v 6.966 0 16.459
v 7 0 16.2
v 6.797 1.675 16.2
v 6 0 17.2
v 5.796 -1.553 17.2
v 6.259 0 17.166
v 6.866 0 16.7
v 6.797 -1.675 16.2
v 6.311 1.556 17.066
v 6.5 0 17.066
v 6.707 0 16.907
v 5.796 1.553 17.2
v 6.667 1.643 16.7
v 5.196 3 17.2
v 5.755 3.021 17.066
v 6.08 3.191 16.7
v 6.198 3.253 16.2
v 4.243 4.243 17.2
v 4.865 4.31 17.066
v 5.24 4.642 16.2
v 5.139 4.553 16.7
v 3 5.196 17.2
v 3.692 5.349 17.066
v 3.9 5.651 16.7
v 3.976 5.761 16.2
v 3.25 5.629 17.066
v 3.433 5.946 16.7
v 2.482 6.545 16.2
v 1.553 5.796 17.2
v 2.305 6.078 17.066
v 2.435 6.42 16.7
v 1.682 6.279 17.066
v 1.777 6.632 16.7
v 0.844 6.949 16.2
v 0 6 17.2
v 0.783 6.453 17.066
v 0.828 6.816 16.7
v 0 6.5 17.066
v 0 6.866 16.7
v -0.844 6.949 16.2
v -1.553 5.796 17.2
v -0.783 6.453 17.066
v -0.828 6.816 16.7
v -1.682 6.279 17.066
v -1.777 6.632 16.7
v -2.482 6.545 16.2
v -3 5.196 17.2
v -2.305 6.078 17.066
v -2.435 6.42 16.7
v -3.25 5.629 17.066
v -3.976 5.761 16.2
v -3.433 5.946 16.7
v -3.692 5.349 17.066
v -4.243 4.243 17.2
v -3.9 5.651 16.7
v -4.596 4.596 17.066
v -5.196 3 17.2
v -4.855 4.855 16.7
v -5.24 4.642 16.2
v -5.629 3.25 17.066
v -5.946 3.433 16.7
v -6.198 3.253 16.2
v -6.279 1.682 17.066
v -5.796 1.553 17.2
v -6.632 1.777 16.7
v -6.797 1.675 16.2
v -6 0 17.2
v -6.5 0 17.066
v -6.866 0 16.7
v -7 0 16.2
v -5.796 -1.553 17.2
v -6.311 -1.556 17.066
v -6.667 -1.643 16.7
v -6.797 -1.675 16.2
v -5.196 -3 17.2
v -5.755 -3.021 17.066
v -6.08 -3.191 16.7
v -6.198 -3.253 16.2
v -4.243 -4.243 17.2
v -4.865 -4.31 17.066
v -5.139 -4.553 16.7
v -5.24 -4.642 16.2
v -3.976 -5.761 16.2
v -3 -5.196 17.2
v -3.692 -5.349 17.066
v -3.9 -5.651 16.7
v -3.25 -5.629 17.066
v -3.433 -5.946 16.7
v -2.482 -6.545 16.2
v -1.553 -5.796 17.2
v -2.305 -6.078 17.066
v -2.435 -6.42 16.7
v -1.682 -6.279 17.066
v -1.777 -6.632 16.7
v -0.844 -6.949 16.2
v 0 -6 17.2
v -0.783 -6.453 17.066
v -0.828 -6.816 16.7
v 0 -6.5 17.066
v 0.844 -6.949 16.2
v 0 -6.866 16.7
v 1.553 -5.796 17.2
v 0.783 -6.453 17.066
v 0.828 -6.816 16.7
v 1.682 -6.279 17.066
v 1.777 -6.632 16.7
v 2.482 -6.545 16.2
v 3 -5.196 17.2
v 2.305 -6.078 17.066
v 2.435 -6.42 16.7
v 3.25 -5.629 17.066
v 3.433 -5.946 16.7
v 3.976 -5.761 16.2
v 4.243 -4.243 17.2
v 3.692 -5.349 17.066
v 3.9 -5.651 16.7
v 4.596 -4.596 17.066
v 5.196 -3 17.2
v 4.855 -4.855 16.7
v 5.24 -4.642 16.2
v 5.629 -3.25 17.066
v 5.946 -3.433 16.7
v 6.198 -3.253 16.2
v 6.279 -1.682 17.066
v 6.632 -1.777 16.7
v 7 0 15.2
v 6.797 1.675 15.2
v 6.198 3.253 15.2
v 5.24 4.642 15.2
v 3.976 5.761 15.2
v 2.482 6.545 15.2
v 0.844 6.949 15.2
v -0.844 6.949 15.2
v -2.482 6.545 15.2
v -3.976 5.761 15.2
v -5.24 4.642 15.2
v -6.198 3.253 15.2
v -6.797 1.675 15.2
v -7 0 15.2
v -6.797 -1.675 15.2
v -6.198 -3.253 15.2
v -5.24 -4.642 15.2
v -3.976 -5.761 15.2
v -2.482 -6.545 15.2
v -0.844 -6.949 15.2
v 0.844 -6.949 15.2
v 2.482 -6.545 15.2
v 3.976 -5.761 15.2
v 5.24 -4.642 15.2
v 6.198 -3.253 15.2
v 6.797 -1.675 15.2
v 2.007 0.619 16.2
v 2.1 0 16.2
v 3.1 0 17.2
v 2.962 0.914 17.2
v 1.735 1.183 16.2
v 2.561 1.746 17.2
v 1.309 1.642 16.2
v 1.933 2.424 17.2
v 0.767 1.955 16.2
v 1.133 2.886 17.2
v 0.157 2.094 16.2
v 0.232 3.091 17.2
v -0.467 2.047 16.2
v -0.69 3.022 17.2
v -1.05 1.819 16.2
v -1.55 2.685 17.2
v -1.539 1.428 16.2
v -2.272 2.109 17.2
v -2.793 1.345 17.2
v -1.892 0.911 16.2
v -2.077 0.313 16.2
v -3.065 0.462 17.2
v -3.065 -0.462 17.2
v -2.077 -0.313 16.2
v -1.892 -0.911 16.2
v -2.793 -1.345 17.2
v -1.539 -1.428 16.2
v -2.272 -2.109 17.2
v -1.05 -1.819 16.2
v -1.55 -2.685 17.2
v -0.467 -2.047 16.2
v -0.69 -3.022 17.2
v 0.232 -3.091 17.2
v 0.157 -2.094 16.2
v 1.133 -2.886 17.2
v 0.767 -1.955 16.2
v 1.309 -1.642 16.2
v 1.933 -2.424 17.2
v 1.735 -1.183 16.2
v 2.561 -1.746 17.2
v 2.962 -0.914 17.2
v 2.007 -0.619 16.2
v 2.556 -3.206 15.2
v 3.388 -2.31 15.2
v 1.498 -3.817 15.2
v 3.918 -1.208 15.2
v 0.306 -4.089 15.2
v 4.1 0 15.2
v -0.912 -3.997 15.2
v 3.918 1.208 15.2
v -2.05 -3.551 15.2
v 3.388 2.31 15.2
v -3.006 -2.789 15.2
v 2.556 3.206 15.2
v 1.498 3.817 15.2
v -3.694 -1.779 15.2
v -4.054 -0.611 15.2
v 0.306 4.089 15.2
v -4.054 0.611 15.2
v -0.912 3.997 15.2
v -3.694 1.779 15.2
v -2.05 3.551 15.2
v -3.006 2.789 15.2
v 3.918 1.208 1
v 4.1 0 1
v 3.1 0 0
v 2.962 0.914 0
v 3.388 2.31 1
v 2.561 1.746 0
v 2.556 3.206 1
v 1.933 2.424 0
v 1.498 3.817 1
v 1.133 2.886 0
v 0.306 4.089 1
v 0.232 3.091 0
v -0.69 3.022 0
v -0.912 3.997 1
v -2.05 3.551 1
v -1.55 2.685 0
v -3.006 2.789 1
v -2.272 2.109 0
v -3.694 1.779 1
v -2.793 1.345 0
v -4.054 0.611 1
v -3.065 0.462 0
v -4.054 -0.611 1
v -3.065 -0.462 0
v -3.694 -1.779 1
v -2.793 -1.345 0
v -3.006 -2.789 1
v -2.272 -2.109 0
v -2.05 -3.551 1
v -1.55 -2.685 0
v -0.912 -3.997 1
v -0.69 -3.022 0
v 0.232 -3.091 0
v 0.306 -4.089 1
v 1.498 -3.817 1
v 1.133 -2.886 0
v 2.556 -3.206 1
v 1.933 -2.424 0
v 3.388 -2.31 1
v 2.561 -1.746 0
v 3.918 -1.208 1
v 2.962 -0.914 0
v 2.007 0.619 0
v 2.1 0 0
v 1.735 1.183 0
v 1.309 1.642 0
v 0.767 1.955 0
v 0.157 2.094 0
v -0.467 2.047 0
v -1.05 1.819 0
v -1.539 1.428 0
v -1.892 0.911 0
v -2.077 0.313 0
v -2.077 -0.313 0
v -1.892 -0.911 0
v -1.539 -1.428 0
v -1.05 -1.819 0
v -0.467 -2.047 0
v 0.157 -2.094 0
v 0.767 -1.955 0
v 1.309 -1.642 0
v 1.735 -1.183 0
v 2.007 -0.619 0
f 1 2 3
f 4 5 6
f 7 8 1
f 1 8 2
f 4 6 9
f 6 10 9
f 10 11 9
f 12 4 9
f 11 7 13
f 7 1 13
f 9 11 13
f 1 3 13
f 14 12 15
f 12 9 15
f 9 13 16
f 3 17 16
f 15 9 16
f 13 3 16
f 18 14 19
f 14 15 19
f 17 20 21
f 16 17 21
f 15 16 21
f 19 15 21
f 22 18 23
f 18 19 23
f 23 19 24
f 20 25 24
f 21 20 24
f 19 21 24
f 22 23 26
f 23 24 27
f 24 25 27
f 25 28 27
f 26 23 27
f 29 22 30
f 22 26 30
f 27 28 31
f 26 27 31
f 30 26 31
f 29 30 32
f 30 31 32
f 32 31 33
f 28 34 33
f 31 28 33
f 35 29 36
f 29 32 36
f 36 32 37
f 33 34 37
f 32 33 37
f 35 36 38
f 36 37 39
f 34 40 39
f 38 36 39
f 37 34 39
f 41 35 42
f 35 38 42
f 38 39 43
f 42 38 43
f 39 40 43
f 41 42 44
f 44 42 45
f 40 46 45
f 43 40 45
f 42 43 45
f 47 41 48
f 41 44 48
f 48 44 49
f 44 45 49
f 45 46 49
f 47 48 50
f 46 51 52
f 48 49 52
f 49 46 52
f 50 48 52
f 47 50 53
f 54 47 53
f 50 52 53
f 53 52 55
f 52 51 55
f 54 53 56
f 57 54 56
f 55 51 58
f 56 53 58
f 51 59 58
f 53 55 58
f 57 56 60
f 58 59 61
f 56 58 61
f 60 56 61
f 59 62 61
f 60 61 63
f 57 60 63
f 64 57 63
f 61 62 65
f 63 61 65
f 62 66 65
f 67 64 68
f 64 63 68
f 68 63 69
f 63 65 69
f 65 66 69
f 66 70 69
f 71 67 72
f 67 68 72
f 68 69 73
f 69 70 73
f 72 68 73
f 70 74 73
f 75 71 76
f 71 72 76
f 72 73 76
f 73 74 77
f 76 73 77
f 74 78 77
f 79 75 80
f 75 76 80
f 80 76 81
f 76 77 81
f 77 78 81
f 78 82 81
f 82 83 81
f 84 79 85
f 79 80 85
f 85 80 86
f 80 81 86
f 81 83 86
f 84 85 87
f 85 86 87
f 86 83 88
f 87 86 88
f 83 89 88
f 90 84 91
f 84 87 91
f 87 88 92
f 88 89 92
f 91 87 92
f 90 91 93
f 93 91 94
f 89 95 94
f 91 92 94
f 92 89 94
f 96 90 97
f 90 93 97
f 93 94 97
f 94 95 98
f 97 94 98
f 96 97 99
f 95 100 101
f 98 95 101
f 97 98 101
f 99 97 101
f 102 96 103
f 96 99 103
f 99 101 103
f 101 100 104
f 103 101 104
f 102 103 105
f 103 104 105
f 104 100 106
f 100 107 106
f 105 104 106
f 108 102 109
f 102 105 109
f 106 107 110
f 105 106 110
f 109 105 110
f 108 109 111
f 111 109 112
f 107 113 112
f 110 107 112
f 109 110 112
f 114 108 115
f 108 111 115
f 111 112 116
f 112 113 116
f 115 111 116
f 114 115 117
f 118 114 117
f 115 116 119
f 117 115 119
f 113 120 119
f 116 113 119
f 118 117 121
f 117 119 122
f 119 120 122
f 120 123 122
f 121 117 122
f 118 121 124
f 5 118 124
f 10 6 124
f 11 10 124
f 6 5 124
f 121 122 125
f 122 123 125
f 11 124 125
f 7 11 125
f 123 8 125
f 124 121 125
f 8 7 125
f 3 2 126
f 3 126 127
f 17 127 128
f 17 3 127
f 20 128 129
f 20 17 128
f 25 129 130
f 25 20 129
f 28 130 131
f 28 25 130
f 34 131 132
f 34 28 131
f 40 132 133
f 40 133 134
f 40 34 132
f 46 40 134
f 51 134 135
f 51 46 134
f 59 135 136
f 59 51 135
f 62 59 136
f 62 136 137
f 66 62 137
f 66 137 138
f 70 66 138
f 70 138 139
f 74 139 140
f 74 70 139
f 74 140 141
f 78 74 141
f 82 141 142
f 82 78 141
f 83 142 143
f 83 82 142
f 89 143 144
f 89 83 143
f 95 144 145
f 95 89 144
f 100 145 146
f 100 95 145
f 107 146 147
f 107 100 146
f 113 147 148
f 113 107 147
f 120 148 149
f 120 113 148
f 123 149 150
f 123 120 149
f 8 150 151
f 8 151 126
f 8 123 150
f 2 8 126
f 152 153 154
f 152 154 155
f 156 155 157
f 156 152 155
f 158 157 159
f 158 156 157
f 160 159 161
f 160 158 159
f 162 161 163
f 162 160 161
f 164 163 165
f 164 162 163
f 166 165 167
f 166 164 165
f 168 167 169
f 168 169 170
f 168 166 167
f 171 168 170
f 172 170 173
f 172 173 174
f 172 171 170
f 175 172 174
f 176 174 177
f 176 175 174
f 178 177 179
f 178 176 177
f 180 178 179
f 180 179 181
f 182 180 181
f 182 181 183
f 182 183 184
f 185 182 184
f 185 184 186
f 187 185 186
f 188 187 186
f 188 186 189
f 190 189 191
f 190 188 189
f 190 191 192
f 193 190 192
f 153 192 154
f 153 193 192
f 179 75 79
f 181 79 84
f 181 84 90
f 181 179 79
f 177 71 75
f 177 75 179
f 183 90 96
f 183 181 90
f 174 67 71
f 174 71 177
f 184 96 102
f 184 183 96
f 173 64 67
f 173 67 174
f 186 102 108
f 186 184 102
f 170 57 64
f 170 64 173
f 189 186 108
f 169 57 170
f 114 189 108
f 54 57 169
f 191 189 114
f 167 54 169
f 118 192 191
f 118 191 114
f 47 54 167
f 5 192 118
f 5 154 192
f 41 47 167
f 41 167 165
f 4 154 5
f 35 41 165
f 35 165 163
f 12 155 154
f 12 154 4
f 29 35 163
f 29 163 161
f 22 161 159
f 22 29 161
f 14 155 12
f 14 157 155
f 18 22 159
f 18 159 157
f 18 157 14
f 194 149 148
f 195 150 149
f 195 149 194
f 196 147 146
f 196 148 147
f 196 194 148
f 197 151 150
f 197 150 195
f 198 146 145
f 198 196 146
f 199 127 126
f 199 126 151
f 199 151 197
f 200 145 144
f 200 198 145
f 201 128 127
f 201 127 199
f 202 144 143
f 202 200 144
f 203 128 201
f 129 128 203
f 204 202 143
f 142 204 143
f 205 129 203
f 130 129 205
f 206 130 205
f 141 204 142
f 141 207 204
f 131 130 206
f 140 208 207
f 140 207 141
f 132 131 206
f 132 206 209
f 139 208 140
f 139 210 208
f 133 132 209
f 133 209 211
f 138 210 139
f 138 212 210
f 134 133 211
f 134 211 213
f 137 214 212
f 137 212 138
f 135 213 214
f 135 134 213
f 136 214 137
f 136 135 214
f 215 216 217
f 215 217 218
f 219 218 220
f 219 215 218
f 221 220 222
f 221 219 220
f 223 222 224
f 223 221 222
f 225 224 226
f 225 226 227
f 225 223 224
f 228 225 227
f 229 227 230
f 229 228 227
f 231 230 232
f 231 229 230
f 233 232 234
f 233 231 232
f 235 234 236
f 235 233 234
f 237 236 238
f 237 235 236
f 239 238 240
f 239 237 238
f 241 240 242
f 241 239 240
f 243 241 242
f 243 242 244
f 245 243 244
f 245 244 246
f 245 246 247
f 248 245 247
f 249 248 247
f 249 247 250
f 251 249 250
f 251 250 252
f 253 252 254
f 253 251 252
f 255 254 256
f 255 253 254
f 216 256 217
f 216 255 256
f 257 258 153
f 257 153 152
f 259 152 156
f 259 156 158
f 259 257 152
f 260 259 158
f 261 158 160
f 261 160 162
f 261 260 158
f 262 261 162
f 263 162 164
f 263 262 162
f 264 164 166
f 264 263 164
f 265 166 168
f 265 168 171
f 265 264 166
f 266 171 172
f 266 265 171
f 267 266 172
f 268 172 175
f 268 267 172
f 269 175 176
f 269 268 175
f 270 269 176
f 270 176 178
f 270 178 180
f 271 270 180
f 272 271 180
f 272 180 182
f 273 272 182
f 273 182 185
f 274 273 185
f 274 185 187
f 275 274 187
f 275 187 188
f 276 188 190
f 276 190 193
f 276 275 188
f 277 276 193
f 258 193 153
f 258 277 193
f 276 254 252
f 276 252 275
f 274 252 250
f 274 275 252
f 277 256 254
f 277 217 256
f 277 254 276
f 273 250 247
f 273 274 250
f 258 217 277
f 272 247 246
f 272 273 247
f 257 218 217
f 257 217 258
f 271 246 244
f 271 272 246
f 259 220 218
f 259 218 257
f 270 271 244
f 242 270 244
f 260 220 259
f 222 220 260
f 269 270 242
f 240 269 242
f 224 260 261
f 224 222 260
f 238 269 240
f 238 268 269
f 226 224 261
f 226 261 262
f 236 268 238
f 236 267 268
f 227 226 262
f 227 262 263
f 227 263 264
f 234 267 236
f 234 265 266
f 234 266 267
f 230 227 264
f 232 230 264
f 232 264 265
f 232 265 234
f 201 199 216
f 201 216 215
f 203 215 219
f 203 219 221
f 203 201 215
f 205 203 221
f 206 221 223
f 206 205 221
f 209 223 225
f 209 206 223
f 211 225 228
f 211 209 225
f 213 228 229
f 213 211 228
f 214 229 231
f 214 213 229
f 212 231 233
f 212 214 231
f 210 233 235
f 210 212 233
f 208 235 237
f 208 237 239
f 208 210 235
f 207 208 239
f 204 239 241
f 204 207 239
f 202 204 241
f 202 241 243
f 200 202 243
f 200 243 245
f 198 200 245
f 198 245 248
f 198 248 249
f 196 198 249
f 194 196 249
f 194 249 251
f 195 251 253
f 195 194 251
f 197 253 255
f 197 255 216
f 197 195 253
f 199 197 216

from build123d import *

# Parameters (mm, degrees)
F2_SIZE = 1
F3_R    = 1


with BuildPart() as f1:
    # F0 (on Front) → F1 (revolve)
    with BuildSketch(Plane.XZ):
        Polygon((7, 17.2), (2.1, 17.2), (2.1, 0), (4.1, 0), (4.1, 15.2), (7, 15.2), align=None)
    revolve(axis=Axis((0, 0, 8.6), (0, 0, 1)))

    # F2
    f2_edges = [f1.edges().sort_by_distance(p)[0] for p in [
        (-2.1, 0, 17.2),
        (-4.1, 0, 0),
    ]]
    chamfer(f2_edges, length=F2_SIZE)

    # F3
    f3_edges = [f1.edges().sort_by_distance(p)[0] for p in [
        (-7, 0, 17.2),
    ]]
    fillet(f3_edges, radius=F3_R)


solid = f1.part
